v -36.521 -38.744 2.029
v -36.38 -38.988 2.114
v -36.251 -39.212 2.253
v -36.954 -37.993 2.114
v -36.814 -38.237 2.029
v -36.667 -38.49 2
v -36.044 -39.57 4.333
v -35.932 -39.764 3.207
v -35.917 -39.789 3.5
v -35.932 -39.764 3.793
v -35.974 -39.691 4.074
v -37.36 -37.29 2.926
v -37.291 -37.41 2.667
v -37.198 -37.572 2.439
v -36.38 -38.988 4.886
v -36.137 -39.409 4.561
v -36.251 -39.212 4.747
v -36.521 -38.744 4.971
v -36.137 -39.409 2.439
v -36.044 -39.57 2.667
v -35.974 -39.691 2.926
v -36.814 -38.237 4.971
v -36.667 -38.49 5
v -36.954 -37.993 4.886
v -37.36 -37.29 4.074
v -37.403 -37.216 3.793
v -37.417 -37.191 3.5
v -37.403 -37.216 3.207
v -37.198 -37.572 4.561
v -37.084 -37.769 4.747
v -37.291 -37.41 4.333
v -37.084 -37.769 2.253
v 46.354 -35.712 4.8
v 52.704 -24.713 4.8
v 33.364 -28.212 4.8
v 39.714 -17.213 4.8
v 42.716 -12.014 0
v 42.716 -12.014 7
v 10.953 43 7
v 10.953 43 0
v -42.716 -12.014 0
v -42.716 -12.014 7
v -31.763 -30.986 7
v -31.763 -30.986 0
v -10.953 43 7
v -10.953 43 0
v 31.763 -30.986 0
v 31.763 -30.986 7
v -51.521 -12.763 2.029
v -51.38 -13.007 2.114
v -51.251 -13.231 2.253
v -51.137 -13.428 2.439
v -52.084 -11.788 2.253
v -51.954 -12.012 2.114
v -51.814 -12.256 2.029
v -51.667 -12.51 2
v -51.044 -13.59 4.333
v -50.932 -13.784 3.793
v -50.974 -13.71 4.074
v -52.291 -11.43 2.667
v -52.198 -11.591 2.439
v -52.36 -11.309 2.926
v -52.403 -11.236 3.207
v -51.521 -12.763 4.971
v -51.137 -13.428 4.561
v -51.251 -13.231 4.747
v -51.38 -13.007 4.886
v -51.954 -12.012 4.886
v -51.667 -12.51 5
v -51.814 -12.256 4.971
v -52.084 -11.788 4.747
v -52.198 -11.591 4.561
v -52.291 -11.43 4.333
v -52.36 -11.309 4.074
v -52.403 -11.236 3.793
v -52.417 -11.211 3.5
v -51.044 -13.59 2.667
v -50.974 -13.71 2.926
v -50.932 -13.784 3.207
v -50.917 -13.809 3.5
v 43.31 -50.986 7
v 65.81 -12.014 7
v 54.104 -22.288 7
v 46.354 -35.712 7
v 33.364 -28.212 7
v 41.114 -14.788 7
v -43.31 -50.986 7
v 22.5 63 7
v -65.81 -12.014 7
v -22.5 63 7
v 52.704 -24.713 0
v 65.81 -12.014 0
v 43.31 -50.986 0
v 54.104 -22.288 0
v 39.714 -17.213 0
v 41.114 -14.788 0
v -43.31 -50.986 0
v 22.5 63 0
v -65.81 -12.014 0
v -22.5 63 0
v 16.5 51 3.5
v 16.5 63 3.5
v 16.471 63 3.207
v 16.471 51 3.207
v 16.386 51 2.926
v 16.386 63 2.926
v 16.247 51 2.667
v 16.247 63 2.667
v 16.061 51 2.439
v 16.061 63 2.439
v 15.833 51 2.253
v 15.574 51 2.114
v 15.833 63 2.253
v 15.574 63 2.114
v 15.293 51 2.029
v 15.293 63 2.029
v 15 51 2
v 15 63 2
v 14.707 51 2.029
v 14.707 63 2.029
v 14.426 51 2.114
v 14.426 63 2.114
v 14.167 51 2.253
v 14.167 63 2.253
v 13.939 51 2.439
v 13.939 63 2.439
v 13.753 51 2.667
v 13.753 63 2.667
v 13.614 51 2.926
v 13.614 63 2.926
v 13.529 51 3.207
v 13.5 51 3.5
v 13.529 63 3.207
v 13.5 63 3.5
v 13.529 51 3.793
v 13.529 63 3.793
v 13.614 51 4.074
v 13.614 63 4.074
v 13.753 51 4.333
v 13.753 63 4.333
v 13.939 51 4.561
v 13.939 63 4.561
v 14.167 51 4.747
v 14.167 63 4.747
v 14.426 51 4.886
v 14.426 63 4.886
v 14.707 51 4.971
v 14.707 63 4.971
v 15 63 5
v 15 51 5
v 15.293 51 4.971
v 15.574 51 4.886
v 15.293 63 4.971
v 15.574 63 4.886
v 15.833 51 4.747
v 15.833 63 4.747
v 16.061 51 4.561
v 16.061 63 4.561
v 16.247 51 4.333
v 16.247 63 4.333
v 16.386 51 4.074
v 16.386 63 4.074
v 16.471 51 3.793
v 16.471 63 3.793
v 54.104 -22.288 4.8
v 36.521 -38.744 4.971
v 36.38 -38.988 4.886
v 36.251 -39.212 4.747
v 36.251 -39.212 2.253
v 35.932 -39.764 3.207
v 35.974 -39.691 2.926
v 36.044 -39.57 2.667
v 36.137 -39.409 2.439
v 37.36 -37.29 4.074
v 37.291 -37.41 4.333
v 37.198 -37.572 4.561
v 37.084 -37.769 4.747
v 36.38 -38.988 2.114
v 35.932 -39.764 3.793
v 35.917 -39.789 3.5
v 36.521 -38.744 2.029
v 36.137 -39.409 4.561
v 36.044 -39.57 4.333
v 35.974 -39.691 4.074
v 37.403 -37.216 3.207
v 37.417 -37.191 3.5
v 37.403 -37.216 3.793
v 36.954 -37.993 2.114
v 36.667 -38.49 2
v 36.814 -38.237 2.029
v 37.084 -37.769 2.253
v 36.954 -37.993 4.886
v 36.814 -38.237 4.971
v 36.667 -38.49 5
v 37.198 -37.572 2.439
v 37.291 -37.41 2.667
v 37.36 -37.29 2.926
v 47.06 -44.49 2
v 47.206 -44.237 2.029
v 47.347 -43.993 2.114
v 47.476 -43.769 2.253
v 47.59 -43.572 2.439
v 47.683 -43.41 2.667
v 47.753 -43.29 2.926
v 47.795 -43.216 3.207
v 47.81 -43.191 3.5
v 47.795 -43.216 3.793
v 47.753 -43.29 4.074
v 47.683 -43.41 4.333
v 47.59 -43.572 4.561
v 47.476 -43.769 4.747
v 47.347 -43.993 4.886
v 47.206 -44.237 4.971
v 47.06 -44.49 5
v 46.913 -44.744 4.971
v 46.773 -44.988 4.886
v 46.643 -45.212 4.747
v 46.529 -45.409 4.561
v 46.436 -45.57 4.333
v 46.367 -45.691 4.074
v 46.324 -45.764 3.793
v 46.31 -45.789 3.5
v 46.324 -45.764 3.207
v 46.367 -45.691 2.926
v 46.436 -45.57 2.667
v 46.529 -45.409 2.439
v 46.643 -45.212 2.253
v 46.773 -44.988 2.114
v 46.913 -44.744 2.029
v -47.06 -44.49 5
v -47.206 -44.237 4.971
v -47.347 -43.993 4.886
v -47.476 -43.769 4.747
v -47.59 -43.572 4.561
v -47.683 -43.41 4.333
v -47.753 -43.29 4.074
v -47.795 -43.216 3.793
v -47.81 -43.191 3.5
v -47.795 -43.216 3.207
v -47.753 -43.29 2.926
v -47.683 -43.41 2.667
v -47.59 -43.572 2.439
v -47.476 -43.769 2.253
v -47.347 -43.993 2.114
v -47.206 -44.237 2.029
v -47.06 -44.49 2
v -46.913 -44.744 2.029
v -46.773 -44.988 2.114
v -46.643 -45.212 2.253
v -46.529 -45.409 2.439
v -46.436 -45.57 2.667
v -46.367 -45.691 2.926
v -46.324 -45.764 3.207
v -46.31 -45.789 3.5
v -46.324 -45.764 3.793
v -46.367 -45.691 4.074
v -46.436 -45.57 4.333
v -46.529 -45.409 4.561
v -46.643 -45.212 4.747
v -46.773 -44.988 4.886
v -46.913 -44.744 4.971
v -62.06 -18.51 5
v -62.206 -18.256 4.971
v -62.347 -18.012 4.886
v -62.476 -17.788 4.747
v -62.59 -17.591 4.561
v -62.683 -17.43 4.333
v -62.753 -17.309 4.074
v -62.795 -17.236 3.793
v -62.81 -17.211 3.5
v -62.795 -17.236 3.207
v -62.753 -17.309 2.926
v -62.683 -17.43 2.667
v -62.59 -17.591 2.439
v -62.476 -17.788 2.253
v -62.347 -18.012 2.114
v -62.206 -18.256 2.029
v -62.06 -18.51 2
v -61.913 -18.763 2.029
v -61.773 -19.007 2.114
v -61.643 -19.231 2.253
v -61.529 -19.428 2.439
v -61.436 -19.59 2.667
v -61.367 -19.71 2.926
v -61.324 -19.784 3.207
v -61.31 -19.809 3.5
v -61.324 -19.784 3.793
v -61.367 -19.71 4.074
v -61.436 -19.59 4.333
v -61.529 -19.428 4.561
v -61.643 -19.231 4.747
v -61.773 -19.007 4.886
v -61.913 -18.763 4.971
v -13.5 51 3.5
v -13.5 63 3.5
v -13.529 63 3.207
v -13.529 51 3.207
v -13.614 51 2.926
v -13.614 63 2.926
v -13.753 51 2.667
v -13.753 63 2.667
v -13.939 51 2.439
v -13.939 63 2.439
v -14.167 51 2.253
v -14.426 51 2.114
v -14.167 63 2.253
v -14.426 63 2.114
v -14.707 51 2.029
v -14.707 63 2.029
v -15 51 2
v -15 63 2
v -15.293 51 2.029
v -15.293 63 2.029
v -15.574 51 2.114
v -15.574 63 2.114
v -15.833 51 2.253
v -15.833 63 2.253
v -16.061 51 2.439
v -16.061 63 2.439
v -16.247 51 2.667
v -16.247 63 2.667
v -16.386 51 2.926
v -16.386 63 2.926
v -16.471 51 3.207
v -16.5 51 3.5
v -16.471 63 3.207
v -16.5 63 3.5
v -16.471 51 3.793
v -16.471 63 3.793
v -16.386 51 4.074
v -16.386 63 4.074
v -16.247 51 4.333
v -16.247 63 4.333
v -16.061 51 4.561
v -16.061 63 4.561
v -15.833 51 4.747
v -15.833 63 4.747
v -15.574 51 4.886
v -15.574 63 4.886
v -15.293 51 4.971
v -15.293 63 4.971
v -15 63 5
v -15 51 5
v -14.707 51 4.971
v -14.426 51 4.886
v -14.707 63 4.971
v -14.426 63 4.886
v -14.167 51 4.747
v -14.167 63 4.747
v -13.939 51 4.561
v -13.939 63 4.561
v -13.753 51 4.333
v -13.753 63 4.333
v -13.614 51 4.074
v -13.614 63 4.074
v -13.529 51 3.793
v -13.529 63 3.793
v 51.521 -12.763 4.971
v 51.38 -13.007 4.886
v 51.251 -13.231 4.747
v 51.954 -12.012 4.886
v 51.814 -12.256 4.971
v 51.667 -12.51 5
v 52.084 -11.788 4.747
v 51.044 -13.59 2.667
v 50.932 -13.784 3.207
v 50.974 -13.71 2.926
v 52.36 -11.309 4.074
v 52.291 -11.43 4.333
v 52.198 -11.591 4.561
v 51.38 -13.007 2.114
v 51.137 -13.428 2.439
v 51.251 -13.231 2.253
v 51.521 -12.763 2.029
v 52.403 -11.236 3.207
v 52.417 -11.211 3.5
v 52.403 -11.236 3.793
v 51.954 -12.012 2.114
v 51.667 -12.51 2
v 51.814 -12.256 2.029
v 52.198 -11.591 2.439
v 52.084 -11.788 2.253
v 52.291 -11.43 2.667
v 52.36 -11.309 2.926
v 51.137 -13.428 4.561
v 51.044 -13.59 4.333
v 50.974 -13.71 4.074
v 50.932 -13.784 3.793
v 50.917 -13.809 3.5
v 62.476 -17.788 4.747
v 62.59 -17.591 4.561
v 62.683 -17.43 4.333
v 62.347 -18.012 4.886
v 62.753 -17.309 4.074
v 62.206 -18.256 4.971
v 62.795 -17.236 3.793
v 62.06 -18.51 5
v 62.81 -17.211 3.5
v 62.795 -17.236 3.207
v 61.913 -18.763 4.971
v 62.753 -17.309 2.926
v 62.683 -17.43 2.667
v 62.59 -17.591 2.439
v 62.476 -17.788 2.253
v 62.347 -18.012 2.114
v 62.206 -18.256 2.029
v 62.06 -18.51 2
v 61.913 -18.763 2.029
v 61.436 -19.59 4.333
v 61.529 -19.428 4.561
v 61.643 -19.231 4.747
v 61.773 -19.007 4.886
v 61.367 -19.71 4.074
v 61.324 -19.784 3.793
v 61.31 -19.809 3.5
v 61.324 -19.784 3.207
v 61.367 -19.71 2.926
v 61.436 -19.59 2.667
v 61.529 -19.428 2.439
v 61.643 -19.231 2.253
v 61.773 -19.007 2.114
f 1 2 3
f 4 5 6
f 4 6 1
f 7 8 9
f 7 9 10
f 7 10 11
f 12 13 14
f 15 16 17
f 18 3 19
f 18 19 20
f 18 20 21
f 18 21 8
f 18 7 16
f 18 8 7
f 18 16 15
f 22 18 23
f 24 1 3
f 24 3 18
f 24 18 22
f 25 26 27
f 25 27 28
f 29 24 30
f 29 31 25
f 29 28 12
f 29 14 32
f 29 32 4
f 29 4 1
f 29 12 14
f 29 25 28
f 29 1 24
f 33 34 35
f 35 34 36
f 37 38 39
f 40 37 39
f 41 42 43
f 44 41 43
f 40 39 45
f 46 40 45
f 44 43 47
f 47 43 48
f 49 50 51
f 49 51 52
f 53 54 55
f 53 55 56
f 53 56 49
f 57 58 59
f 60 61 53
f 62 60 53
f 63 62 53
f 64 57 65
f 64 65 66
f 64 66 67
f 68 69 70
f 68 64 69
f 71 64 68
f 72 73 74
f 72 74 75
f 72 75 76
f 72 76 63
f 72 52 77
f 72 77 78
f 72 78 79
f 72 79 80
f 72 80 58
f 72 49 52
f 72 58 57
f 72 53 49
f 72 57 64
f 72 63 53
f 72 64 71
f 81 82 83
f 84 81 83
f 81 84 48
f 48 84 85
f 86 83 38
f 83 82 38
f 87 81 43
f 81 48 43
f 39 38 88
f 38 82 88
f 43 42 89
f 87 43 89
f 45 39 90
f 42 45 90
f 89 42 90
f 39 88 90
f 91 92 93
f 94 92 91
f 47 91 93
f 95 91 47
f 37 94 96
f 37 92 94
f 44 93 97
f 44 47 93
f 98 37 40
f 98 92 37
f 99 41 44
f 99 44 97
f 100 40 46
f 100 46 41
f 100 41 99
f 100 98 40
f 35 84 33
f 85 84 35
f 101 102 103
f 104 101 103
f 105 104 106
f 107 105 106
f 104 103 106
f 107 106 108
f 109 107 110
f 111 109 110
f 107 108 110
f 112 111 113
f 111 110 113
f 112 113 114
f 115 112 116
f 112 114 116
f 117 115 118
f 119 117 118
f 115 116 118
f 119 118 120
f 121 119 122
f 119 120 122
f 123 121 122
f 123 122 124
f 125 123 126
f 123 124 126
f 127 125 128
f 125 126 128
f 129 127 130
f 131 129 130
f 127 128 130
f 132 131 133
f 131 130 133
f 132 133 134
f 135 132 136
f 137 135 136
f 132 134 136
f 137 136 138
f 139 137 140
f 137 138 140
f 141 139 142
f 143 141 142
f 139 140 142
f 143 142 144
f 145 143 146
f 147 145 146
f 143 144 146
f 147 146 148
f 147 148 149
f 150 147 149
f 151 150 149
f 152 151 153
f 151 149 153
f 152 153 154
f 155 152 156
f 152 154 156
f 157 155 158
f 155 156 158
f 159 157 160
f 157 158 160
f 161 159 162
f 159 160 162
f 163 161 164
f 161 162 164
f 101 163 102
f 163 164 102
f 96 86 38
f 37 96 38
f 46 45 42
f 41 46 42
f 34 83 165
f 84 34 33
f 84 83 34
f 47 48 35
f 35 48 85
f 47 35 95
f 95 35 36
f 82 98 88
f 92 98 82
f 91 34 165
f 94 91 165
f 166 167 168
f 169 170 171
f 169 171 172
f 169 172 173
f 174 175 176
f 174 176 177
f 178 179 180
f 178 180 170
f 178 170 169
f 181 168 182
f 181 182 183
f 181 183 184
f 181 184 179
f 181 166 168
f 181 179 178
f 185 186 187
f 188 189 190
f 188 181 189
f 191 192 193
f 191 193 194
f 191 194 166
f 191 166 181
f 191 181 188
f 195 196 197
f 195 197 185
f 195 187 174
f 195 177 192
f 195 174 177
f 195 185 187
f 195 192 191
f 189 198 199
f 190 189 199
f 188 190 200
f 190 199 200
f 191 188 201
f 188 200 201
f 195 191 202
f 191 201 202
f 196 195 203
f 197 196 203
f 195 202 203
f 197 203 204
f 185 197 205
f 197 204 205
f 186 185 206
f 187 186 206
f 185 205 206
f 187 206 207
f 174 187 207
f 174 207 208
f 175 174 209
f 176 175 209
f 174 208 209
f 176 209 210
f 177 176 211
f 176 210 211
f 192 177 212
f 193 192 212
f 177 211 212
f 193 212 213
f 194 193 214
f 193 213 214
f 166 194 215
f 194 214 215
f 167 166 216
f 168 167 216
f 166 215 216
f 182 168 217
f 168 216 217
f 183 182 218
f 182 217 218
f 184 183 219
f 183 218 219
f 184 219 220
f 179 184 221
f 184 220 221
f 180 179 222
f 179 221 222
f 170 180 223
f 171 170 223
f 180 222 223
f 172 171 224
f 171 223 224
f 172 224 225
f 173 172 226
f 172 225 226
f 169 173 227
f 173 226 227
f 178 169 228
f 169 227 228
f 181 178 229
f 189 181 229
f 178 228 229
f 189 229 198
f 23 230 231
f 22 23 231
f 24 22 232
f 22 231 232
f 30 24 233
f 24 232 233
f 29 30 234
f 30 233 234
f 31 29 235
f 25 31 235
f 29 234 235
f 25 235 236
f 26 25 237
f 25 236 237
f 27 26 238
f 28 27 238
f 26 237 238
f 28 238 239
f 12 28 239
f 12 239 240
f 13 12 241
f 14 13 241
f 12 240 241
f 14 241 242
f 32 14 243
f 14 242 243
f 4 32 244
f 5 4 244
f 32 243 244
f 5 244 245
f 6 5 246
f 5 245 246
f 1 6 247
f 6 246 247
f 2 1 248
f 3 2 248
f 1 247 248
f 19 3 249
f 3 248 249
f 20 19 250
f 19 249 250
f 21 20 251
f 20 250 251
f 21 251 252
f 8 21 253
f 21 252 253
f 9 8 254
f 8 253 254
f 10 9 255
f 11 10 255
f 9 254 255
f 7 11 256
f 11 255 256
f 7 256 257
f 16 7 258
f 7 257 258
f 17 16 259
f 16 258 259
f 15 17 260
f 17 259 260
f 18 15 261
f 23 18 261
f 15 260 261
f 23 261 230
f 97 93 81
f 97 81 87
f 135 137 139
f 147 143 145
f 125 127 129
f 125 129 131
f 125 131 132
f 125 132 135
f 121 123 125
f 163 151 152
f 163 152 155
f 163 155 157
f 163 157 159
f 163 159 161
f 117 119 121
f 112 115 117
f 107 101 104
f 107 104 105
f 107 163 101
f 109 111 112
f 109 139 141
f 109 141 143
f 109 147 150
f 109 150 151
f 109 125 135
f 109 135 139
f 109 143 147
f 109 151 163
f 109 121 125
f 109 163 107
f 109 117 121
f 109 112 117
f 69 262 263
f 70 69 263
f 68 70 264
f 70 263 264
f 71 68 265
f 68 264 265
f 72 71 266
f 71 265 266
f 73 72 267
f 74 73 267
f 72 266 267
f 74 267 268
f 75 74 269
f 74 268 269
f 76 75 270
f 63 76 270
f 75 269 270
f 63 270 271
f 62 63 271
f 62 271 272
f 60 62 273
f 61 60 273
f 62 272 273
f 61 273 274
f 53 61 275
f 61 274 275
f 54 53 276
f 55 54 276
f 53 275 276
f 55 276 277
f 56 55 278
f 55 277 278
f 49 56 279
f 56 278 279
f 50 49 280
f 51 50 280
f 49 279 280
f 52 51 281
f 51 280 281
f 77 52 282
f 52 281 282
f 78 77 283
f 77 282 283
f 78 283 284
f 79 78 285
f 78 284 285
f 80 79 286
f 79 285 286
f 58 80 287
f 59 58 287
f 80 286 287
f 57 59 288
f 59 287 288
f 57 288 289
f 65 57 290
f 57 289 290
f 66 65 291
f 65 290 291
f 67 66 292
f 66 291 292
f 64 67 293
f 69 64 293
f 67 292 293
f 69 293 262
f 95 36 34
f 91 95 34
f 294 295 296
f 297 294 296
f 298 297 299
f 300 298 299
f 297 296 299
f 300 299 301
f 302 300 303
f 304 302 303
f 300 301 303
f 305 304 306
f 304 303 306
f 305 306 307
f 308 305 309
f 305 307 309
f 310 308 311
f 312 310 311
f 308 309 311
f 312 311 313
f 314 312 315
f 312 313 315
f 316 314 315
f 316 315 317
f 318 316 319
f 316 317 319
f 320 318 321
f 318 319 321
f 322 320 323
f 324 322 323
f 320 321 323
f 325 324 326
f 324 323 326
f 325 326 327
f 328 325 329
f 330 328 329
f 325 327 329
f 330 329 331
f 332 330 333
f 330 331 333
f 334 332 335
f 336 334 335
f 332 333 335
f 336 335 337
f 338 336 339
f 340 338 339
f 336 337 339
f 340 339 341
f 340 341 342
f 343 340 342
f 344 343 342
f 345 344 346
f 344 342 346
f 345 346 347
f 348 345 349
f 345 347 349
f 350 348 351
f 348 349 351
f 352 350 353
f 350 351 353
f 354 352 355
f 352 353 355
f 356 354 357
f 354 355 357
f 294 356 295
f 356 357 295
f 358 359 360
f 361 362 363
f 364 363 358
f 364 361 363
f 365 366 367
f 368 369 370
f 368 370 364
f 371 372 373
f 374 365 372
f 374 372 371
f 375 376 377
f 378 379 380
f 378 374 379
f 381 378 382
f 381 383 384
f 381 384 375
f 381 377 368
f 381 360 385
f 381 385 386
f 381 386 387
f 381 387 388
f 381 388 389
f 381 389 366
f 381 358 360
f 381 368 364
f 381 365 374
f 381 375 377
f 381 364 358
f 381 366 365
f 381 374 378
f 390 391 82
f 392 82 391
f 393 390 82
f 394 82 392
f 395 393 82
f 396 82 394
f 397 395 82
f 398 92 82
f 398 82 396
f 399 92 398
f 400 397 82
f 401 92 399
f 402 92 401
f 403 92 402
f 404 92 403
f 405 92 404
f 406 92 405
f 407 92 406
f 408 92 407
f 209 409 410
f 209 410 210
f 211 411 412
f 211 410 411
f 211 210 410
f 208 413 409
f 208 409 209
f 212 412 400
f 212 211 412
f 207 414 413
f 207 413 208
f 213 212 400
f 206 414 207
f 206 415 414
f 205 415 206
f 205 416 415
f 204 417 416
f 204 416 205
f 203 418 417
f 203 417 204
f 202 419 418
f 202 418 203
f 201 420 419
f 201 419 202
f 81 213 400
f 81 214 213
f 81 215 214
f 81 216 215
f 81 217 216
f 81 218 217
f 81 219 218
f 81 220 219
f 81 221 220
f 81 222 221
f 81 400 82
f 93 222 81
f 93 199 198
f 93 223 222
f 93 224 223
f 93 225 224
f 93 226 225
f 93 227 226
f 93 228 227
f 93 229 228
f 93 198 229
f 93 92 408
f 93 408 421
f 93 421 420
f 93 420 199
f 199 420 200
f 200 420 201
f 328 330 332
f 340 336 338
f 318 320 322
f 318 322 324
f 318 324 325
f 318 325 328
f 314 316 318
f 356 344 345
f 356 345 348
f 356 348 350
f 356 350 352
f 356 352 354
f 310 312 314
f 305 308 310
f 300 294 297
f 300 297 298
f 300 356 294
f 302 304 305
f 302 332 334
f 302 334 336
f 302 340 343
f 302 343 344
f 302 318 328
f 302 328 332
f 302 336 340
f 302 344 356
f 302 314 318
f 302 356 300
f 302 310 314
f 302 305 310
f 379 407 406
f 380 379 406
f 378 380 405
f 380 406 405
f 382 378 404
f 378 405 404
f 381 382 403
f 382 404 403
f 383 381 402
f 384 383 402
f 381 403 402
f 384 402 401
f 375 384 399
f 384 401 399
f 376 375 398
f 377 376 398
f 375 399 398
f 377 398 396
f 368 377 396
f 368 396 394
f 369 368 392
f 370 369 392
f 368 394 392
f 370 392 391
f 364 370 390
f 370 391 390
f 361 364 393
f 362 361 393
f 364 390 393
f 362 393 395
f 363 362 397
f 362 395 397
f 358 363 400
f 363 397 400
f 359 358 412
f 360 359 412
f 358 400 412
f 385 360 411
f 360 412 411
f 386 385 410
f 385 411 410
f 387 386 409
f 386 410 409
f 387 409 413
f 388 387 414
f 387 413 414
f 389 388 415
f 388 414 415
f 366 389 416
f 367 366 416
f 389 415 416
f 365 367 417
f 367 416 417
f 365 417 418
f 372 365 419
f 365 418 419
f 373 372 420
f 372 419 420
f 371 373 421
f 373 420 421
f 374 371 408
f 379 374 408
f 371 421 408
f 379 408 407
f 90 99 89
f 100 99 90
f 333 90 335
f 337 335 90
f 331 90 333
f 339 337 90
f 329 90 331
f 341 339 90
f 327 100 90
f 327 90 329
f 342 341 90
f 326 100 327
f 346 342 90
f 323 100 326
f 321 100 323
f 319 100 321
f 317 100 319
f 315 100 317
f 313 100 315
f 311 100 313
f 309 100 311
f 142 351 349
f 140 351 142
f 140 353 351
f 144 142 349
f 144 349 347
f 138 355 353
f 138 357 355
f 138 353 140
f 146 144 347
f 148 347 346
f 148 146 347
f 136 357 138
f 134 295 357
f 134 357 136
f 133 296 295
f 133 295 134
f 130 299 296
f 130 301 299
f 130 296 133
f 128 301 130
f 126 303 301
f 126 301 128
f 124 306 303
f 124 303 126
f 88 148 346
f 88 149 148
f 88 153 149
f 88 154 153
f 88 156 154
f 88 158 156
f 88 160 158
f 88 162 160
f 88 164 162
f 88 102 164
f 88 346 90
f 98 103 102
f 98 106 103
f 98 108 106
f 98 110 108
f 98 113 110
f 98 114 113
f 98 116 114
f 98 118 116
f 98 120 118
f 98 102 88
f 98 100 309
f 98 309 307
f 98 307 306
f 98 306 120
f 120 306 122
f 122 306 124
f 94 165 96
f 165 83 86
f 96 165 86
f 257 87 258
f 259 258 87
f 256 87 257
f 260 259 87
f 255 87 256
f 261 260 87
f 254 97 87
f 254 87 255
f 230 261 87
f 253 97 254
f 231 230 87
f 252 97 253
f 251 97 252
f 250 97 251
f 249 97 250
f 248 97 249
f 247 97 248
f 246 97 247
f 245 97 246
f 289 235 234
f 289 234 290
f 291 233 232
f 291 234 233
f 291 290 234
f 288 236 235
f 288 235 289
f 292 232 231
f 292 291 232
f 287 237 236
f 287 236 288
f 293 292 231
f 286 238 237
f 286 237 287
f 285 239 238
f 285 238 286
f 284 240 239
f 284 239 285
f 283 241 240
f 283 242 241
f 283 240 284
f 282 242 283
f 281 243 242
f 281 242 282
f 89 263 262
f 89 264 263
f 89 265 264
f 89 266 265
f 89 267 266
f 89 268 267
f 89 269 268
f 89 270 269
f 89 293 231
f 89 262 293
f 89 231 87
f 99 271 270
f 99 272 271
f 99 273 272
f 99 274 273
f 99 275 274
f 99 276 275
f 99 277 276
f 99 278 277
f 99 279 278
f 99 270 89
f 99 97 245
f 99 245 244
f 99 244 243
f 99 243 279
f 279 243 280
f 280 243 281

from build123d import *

# Parameters (mm, degrees)
EXTRUDE_1_DEPTH     = 7
SKETCH_12_R         = 1.5
CUT_EXTRUDE_1_DEPTH = 12
SKETCH_13_R         = 1.5
CUT_EXTRUDE_2_DEPTH = 12
SKETCH_14_R         = 1.5
CUT_EXTRUDE_3_DEPTH = 12
CUT_EXTRUDE_4_DEPTH = 8
CUT_EXTRUDE_5_DEPTH = 2.2
CUT_EXTRUDE_6_DEPTH = 5.8


with BuildPart() as part:
    # 草圖1 → 填料-伸長1 (new body)
    with BuildSketch(Plane.XY):
        Polygon((-22.5, 63), (22.5, 63), (65.809600438, -12.014428415), (43.309600438, -50.985571585), (-43.309600438, -50.985571585), (-65.809600438, -12.014428415), align=None)
    extrude(amount=EXTRUDE_1_DEPTH)

    # 草圖12 → 除料-伸長1 (cut)
    with BuildSketch(Plane(origin=(-54.559600438, -31.5, 0), x_dir=(0, 0, 1), z_dir=(-0.866025404, -0.5, 0))):
        with Locations((3.5, 15)):
            Circle(SKETCH_12_R)
        with Locations((3.5, -15)):
            Circle(SKETCH_12_R)
    extrude(amount=-CUT_EXTRUDE_1_DEPTH, mode=Mode.SUBTRACT)

    # 草圖13 → 除料-伸長2 (cut)
    with BuildSketch(Plane(origin=(54.559600438, -31.5, 0), x_dir=(0, 0, -1), z_dir=(0.866025404, -0.5, 0))):
        with Locations((-3.5, 15)):
            Circle(SKETCH_13_R)
        with Locations((-3.5, -15)):
            Circle(SKETCH_13_R)
    extrude(amount=-CUT_EXTRUDE_2_DEPTH, mode=Mode.SUBTRACT)

    # 草圖14 → 除料-伸長3 (cut)
    with BuildSketch(Plane(origin=(0, 63, 0), x_dir=(1, 0, 0), z_dir=(0, 1, 0))):
        with Locations((-15, -3.5)):
            Circle(SKETCH_14_R)
        with Locations((15, -3.5)):
            Circle(SKETCH_14_R)
    extrude(amount=-CUT_EXTRUDE_3_DEPTH, mode=Mode.SUBTRACT)

    # 草圖15 → 除料-伸長4 (cut, through all)
    with BuildSketch(Plane.XY.offset(7)):
        Polygon((31.762595055, -30.985571585), (42.715589671, -12.014428415), (10.952994616, 43), (-10.952994616, 43), (-42.715589671, -12.014428415), (-31.762595055, -30.985571585), align=None)
    extrude(amount=-CUT_EXTRUDE_4_DEPTH, mode=Mode.SUBTRACT)

    # 草圖16 → 除料-伸長5 (cut)
    with BuildSketch(Plane.XY.offset(7)):
        Polygon((41.114092363, -14.788303121), (54.104473419, -22.288303121), (46.354473419, -35.711696879), (33.364092363, -28.211696879), align=None)
    extrude(amount=-CUT_EXTRUDE_5_DEPTH, mode=Mode.SUBTRACT)

    # 草圖17 → 除料-伸長6 (cut, through all)
    with BuildSketch(Plane.XY.offset(4.8)):
        Polygon((41.114092363, -14.788303121), (39.714092363, -17.213174251), (52.704473419, -24.713174251), (54.104473419, -22.288303121), align=None)
    extrude(amount=-CUT_EXTRUDE_6_DEPTH, mode=Mode.SUBTRACT)


solid = part.part
